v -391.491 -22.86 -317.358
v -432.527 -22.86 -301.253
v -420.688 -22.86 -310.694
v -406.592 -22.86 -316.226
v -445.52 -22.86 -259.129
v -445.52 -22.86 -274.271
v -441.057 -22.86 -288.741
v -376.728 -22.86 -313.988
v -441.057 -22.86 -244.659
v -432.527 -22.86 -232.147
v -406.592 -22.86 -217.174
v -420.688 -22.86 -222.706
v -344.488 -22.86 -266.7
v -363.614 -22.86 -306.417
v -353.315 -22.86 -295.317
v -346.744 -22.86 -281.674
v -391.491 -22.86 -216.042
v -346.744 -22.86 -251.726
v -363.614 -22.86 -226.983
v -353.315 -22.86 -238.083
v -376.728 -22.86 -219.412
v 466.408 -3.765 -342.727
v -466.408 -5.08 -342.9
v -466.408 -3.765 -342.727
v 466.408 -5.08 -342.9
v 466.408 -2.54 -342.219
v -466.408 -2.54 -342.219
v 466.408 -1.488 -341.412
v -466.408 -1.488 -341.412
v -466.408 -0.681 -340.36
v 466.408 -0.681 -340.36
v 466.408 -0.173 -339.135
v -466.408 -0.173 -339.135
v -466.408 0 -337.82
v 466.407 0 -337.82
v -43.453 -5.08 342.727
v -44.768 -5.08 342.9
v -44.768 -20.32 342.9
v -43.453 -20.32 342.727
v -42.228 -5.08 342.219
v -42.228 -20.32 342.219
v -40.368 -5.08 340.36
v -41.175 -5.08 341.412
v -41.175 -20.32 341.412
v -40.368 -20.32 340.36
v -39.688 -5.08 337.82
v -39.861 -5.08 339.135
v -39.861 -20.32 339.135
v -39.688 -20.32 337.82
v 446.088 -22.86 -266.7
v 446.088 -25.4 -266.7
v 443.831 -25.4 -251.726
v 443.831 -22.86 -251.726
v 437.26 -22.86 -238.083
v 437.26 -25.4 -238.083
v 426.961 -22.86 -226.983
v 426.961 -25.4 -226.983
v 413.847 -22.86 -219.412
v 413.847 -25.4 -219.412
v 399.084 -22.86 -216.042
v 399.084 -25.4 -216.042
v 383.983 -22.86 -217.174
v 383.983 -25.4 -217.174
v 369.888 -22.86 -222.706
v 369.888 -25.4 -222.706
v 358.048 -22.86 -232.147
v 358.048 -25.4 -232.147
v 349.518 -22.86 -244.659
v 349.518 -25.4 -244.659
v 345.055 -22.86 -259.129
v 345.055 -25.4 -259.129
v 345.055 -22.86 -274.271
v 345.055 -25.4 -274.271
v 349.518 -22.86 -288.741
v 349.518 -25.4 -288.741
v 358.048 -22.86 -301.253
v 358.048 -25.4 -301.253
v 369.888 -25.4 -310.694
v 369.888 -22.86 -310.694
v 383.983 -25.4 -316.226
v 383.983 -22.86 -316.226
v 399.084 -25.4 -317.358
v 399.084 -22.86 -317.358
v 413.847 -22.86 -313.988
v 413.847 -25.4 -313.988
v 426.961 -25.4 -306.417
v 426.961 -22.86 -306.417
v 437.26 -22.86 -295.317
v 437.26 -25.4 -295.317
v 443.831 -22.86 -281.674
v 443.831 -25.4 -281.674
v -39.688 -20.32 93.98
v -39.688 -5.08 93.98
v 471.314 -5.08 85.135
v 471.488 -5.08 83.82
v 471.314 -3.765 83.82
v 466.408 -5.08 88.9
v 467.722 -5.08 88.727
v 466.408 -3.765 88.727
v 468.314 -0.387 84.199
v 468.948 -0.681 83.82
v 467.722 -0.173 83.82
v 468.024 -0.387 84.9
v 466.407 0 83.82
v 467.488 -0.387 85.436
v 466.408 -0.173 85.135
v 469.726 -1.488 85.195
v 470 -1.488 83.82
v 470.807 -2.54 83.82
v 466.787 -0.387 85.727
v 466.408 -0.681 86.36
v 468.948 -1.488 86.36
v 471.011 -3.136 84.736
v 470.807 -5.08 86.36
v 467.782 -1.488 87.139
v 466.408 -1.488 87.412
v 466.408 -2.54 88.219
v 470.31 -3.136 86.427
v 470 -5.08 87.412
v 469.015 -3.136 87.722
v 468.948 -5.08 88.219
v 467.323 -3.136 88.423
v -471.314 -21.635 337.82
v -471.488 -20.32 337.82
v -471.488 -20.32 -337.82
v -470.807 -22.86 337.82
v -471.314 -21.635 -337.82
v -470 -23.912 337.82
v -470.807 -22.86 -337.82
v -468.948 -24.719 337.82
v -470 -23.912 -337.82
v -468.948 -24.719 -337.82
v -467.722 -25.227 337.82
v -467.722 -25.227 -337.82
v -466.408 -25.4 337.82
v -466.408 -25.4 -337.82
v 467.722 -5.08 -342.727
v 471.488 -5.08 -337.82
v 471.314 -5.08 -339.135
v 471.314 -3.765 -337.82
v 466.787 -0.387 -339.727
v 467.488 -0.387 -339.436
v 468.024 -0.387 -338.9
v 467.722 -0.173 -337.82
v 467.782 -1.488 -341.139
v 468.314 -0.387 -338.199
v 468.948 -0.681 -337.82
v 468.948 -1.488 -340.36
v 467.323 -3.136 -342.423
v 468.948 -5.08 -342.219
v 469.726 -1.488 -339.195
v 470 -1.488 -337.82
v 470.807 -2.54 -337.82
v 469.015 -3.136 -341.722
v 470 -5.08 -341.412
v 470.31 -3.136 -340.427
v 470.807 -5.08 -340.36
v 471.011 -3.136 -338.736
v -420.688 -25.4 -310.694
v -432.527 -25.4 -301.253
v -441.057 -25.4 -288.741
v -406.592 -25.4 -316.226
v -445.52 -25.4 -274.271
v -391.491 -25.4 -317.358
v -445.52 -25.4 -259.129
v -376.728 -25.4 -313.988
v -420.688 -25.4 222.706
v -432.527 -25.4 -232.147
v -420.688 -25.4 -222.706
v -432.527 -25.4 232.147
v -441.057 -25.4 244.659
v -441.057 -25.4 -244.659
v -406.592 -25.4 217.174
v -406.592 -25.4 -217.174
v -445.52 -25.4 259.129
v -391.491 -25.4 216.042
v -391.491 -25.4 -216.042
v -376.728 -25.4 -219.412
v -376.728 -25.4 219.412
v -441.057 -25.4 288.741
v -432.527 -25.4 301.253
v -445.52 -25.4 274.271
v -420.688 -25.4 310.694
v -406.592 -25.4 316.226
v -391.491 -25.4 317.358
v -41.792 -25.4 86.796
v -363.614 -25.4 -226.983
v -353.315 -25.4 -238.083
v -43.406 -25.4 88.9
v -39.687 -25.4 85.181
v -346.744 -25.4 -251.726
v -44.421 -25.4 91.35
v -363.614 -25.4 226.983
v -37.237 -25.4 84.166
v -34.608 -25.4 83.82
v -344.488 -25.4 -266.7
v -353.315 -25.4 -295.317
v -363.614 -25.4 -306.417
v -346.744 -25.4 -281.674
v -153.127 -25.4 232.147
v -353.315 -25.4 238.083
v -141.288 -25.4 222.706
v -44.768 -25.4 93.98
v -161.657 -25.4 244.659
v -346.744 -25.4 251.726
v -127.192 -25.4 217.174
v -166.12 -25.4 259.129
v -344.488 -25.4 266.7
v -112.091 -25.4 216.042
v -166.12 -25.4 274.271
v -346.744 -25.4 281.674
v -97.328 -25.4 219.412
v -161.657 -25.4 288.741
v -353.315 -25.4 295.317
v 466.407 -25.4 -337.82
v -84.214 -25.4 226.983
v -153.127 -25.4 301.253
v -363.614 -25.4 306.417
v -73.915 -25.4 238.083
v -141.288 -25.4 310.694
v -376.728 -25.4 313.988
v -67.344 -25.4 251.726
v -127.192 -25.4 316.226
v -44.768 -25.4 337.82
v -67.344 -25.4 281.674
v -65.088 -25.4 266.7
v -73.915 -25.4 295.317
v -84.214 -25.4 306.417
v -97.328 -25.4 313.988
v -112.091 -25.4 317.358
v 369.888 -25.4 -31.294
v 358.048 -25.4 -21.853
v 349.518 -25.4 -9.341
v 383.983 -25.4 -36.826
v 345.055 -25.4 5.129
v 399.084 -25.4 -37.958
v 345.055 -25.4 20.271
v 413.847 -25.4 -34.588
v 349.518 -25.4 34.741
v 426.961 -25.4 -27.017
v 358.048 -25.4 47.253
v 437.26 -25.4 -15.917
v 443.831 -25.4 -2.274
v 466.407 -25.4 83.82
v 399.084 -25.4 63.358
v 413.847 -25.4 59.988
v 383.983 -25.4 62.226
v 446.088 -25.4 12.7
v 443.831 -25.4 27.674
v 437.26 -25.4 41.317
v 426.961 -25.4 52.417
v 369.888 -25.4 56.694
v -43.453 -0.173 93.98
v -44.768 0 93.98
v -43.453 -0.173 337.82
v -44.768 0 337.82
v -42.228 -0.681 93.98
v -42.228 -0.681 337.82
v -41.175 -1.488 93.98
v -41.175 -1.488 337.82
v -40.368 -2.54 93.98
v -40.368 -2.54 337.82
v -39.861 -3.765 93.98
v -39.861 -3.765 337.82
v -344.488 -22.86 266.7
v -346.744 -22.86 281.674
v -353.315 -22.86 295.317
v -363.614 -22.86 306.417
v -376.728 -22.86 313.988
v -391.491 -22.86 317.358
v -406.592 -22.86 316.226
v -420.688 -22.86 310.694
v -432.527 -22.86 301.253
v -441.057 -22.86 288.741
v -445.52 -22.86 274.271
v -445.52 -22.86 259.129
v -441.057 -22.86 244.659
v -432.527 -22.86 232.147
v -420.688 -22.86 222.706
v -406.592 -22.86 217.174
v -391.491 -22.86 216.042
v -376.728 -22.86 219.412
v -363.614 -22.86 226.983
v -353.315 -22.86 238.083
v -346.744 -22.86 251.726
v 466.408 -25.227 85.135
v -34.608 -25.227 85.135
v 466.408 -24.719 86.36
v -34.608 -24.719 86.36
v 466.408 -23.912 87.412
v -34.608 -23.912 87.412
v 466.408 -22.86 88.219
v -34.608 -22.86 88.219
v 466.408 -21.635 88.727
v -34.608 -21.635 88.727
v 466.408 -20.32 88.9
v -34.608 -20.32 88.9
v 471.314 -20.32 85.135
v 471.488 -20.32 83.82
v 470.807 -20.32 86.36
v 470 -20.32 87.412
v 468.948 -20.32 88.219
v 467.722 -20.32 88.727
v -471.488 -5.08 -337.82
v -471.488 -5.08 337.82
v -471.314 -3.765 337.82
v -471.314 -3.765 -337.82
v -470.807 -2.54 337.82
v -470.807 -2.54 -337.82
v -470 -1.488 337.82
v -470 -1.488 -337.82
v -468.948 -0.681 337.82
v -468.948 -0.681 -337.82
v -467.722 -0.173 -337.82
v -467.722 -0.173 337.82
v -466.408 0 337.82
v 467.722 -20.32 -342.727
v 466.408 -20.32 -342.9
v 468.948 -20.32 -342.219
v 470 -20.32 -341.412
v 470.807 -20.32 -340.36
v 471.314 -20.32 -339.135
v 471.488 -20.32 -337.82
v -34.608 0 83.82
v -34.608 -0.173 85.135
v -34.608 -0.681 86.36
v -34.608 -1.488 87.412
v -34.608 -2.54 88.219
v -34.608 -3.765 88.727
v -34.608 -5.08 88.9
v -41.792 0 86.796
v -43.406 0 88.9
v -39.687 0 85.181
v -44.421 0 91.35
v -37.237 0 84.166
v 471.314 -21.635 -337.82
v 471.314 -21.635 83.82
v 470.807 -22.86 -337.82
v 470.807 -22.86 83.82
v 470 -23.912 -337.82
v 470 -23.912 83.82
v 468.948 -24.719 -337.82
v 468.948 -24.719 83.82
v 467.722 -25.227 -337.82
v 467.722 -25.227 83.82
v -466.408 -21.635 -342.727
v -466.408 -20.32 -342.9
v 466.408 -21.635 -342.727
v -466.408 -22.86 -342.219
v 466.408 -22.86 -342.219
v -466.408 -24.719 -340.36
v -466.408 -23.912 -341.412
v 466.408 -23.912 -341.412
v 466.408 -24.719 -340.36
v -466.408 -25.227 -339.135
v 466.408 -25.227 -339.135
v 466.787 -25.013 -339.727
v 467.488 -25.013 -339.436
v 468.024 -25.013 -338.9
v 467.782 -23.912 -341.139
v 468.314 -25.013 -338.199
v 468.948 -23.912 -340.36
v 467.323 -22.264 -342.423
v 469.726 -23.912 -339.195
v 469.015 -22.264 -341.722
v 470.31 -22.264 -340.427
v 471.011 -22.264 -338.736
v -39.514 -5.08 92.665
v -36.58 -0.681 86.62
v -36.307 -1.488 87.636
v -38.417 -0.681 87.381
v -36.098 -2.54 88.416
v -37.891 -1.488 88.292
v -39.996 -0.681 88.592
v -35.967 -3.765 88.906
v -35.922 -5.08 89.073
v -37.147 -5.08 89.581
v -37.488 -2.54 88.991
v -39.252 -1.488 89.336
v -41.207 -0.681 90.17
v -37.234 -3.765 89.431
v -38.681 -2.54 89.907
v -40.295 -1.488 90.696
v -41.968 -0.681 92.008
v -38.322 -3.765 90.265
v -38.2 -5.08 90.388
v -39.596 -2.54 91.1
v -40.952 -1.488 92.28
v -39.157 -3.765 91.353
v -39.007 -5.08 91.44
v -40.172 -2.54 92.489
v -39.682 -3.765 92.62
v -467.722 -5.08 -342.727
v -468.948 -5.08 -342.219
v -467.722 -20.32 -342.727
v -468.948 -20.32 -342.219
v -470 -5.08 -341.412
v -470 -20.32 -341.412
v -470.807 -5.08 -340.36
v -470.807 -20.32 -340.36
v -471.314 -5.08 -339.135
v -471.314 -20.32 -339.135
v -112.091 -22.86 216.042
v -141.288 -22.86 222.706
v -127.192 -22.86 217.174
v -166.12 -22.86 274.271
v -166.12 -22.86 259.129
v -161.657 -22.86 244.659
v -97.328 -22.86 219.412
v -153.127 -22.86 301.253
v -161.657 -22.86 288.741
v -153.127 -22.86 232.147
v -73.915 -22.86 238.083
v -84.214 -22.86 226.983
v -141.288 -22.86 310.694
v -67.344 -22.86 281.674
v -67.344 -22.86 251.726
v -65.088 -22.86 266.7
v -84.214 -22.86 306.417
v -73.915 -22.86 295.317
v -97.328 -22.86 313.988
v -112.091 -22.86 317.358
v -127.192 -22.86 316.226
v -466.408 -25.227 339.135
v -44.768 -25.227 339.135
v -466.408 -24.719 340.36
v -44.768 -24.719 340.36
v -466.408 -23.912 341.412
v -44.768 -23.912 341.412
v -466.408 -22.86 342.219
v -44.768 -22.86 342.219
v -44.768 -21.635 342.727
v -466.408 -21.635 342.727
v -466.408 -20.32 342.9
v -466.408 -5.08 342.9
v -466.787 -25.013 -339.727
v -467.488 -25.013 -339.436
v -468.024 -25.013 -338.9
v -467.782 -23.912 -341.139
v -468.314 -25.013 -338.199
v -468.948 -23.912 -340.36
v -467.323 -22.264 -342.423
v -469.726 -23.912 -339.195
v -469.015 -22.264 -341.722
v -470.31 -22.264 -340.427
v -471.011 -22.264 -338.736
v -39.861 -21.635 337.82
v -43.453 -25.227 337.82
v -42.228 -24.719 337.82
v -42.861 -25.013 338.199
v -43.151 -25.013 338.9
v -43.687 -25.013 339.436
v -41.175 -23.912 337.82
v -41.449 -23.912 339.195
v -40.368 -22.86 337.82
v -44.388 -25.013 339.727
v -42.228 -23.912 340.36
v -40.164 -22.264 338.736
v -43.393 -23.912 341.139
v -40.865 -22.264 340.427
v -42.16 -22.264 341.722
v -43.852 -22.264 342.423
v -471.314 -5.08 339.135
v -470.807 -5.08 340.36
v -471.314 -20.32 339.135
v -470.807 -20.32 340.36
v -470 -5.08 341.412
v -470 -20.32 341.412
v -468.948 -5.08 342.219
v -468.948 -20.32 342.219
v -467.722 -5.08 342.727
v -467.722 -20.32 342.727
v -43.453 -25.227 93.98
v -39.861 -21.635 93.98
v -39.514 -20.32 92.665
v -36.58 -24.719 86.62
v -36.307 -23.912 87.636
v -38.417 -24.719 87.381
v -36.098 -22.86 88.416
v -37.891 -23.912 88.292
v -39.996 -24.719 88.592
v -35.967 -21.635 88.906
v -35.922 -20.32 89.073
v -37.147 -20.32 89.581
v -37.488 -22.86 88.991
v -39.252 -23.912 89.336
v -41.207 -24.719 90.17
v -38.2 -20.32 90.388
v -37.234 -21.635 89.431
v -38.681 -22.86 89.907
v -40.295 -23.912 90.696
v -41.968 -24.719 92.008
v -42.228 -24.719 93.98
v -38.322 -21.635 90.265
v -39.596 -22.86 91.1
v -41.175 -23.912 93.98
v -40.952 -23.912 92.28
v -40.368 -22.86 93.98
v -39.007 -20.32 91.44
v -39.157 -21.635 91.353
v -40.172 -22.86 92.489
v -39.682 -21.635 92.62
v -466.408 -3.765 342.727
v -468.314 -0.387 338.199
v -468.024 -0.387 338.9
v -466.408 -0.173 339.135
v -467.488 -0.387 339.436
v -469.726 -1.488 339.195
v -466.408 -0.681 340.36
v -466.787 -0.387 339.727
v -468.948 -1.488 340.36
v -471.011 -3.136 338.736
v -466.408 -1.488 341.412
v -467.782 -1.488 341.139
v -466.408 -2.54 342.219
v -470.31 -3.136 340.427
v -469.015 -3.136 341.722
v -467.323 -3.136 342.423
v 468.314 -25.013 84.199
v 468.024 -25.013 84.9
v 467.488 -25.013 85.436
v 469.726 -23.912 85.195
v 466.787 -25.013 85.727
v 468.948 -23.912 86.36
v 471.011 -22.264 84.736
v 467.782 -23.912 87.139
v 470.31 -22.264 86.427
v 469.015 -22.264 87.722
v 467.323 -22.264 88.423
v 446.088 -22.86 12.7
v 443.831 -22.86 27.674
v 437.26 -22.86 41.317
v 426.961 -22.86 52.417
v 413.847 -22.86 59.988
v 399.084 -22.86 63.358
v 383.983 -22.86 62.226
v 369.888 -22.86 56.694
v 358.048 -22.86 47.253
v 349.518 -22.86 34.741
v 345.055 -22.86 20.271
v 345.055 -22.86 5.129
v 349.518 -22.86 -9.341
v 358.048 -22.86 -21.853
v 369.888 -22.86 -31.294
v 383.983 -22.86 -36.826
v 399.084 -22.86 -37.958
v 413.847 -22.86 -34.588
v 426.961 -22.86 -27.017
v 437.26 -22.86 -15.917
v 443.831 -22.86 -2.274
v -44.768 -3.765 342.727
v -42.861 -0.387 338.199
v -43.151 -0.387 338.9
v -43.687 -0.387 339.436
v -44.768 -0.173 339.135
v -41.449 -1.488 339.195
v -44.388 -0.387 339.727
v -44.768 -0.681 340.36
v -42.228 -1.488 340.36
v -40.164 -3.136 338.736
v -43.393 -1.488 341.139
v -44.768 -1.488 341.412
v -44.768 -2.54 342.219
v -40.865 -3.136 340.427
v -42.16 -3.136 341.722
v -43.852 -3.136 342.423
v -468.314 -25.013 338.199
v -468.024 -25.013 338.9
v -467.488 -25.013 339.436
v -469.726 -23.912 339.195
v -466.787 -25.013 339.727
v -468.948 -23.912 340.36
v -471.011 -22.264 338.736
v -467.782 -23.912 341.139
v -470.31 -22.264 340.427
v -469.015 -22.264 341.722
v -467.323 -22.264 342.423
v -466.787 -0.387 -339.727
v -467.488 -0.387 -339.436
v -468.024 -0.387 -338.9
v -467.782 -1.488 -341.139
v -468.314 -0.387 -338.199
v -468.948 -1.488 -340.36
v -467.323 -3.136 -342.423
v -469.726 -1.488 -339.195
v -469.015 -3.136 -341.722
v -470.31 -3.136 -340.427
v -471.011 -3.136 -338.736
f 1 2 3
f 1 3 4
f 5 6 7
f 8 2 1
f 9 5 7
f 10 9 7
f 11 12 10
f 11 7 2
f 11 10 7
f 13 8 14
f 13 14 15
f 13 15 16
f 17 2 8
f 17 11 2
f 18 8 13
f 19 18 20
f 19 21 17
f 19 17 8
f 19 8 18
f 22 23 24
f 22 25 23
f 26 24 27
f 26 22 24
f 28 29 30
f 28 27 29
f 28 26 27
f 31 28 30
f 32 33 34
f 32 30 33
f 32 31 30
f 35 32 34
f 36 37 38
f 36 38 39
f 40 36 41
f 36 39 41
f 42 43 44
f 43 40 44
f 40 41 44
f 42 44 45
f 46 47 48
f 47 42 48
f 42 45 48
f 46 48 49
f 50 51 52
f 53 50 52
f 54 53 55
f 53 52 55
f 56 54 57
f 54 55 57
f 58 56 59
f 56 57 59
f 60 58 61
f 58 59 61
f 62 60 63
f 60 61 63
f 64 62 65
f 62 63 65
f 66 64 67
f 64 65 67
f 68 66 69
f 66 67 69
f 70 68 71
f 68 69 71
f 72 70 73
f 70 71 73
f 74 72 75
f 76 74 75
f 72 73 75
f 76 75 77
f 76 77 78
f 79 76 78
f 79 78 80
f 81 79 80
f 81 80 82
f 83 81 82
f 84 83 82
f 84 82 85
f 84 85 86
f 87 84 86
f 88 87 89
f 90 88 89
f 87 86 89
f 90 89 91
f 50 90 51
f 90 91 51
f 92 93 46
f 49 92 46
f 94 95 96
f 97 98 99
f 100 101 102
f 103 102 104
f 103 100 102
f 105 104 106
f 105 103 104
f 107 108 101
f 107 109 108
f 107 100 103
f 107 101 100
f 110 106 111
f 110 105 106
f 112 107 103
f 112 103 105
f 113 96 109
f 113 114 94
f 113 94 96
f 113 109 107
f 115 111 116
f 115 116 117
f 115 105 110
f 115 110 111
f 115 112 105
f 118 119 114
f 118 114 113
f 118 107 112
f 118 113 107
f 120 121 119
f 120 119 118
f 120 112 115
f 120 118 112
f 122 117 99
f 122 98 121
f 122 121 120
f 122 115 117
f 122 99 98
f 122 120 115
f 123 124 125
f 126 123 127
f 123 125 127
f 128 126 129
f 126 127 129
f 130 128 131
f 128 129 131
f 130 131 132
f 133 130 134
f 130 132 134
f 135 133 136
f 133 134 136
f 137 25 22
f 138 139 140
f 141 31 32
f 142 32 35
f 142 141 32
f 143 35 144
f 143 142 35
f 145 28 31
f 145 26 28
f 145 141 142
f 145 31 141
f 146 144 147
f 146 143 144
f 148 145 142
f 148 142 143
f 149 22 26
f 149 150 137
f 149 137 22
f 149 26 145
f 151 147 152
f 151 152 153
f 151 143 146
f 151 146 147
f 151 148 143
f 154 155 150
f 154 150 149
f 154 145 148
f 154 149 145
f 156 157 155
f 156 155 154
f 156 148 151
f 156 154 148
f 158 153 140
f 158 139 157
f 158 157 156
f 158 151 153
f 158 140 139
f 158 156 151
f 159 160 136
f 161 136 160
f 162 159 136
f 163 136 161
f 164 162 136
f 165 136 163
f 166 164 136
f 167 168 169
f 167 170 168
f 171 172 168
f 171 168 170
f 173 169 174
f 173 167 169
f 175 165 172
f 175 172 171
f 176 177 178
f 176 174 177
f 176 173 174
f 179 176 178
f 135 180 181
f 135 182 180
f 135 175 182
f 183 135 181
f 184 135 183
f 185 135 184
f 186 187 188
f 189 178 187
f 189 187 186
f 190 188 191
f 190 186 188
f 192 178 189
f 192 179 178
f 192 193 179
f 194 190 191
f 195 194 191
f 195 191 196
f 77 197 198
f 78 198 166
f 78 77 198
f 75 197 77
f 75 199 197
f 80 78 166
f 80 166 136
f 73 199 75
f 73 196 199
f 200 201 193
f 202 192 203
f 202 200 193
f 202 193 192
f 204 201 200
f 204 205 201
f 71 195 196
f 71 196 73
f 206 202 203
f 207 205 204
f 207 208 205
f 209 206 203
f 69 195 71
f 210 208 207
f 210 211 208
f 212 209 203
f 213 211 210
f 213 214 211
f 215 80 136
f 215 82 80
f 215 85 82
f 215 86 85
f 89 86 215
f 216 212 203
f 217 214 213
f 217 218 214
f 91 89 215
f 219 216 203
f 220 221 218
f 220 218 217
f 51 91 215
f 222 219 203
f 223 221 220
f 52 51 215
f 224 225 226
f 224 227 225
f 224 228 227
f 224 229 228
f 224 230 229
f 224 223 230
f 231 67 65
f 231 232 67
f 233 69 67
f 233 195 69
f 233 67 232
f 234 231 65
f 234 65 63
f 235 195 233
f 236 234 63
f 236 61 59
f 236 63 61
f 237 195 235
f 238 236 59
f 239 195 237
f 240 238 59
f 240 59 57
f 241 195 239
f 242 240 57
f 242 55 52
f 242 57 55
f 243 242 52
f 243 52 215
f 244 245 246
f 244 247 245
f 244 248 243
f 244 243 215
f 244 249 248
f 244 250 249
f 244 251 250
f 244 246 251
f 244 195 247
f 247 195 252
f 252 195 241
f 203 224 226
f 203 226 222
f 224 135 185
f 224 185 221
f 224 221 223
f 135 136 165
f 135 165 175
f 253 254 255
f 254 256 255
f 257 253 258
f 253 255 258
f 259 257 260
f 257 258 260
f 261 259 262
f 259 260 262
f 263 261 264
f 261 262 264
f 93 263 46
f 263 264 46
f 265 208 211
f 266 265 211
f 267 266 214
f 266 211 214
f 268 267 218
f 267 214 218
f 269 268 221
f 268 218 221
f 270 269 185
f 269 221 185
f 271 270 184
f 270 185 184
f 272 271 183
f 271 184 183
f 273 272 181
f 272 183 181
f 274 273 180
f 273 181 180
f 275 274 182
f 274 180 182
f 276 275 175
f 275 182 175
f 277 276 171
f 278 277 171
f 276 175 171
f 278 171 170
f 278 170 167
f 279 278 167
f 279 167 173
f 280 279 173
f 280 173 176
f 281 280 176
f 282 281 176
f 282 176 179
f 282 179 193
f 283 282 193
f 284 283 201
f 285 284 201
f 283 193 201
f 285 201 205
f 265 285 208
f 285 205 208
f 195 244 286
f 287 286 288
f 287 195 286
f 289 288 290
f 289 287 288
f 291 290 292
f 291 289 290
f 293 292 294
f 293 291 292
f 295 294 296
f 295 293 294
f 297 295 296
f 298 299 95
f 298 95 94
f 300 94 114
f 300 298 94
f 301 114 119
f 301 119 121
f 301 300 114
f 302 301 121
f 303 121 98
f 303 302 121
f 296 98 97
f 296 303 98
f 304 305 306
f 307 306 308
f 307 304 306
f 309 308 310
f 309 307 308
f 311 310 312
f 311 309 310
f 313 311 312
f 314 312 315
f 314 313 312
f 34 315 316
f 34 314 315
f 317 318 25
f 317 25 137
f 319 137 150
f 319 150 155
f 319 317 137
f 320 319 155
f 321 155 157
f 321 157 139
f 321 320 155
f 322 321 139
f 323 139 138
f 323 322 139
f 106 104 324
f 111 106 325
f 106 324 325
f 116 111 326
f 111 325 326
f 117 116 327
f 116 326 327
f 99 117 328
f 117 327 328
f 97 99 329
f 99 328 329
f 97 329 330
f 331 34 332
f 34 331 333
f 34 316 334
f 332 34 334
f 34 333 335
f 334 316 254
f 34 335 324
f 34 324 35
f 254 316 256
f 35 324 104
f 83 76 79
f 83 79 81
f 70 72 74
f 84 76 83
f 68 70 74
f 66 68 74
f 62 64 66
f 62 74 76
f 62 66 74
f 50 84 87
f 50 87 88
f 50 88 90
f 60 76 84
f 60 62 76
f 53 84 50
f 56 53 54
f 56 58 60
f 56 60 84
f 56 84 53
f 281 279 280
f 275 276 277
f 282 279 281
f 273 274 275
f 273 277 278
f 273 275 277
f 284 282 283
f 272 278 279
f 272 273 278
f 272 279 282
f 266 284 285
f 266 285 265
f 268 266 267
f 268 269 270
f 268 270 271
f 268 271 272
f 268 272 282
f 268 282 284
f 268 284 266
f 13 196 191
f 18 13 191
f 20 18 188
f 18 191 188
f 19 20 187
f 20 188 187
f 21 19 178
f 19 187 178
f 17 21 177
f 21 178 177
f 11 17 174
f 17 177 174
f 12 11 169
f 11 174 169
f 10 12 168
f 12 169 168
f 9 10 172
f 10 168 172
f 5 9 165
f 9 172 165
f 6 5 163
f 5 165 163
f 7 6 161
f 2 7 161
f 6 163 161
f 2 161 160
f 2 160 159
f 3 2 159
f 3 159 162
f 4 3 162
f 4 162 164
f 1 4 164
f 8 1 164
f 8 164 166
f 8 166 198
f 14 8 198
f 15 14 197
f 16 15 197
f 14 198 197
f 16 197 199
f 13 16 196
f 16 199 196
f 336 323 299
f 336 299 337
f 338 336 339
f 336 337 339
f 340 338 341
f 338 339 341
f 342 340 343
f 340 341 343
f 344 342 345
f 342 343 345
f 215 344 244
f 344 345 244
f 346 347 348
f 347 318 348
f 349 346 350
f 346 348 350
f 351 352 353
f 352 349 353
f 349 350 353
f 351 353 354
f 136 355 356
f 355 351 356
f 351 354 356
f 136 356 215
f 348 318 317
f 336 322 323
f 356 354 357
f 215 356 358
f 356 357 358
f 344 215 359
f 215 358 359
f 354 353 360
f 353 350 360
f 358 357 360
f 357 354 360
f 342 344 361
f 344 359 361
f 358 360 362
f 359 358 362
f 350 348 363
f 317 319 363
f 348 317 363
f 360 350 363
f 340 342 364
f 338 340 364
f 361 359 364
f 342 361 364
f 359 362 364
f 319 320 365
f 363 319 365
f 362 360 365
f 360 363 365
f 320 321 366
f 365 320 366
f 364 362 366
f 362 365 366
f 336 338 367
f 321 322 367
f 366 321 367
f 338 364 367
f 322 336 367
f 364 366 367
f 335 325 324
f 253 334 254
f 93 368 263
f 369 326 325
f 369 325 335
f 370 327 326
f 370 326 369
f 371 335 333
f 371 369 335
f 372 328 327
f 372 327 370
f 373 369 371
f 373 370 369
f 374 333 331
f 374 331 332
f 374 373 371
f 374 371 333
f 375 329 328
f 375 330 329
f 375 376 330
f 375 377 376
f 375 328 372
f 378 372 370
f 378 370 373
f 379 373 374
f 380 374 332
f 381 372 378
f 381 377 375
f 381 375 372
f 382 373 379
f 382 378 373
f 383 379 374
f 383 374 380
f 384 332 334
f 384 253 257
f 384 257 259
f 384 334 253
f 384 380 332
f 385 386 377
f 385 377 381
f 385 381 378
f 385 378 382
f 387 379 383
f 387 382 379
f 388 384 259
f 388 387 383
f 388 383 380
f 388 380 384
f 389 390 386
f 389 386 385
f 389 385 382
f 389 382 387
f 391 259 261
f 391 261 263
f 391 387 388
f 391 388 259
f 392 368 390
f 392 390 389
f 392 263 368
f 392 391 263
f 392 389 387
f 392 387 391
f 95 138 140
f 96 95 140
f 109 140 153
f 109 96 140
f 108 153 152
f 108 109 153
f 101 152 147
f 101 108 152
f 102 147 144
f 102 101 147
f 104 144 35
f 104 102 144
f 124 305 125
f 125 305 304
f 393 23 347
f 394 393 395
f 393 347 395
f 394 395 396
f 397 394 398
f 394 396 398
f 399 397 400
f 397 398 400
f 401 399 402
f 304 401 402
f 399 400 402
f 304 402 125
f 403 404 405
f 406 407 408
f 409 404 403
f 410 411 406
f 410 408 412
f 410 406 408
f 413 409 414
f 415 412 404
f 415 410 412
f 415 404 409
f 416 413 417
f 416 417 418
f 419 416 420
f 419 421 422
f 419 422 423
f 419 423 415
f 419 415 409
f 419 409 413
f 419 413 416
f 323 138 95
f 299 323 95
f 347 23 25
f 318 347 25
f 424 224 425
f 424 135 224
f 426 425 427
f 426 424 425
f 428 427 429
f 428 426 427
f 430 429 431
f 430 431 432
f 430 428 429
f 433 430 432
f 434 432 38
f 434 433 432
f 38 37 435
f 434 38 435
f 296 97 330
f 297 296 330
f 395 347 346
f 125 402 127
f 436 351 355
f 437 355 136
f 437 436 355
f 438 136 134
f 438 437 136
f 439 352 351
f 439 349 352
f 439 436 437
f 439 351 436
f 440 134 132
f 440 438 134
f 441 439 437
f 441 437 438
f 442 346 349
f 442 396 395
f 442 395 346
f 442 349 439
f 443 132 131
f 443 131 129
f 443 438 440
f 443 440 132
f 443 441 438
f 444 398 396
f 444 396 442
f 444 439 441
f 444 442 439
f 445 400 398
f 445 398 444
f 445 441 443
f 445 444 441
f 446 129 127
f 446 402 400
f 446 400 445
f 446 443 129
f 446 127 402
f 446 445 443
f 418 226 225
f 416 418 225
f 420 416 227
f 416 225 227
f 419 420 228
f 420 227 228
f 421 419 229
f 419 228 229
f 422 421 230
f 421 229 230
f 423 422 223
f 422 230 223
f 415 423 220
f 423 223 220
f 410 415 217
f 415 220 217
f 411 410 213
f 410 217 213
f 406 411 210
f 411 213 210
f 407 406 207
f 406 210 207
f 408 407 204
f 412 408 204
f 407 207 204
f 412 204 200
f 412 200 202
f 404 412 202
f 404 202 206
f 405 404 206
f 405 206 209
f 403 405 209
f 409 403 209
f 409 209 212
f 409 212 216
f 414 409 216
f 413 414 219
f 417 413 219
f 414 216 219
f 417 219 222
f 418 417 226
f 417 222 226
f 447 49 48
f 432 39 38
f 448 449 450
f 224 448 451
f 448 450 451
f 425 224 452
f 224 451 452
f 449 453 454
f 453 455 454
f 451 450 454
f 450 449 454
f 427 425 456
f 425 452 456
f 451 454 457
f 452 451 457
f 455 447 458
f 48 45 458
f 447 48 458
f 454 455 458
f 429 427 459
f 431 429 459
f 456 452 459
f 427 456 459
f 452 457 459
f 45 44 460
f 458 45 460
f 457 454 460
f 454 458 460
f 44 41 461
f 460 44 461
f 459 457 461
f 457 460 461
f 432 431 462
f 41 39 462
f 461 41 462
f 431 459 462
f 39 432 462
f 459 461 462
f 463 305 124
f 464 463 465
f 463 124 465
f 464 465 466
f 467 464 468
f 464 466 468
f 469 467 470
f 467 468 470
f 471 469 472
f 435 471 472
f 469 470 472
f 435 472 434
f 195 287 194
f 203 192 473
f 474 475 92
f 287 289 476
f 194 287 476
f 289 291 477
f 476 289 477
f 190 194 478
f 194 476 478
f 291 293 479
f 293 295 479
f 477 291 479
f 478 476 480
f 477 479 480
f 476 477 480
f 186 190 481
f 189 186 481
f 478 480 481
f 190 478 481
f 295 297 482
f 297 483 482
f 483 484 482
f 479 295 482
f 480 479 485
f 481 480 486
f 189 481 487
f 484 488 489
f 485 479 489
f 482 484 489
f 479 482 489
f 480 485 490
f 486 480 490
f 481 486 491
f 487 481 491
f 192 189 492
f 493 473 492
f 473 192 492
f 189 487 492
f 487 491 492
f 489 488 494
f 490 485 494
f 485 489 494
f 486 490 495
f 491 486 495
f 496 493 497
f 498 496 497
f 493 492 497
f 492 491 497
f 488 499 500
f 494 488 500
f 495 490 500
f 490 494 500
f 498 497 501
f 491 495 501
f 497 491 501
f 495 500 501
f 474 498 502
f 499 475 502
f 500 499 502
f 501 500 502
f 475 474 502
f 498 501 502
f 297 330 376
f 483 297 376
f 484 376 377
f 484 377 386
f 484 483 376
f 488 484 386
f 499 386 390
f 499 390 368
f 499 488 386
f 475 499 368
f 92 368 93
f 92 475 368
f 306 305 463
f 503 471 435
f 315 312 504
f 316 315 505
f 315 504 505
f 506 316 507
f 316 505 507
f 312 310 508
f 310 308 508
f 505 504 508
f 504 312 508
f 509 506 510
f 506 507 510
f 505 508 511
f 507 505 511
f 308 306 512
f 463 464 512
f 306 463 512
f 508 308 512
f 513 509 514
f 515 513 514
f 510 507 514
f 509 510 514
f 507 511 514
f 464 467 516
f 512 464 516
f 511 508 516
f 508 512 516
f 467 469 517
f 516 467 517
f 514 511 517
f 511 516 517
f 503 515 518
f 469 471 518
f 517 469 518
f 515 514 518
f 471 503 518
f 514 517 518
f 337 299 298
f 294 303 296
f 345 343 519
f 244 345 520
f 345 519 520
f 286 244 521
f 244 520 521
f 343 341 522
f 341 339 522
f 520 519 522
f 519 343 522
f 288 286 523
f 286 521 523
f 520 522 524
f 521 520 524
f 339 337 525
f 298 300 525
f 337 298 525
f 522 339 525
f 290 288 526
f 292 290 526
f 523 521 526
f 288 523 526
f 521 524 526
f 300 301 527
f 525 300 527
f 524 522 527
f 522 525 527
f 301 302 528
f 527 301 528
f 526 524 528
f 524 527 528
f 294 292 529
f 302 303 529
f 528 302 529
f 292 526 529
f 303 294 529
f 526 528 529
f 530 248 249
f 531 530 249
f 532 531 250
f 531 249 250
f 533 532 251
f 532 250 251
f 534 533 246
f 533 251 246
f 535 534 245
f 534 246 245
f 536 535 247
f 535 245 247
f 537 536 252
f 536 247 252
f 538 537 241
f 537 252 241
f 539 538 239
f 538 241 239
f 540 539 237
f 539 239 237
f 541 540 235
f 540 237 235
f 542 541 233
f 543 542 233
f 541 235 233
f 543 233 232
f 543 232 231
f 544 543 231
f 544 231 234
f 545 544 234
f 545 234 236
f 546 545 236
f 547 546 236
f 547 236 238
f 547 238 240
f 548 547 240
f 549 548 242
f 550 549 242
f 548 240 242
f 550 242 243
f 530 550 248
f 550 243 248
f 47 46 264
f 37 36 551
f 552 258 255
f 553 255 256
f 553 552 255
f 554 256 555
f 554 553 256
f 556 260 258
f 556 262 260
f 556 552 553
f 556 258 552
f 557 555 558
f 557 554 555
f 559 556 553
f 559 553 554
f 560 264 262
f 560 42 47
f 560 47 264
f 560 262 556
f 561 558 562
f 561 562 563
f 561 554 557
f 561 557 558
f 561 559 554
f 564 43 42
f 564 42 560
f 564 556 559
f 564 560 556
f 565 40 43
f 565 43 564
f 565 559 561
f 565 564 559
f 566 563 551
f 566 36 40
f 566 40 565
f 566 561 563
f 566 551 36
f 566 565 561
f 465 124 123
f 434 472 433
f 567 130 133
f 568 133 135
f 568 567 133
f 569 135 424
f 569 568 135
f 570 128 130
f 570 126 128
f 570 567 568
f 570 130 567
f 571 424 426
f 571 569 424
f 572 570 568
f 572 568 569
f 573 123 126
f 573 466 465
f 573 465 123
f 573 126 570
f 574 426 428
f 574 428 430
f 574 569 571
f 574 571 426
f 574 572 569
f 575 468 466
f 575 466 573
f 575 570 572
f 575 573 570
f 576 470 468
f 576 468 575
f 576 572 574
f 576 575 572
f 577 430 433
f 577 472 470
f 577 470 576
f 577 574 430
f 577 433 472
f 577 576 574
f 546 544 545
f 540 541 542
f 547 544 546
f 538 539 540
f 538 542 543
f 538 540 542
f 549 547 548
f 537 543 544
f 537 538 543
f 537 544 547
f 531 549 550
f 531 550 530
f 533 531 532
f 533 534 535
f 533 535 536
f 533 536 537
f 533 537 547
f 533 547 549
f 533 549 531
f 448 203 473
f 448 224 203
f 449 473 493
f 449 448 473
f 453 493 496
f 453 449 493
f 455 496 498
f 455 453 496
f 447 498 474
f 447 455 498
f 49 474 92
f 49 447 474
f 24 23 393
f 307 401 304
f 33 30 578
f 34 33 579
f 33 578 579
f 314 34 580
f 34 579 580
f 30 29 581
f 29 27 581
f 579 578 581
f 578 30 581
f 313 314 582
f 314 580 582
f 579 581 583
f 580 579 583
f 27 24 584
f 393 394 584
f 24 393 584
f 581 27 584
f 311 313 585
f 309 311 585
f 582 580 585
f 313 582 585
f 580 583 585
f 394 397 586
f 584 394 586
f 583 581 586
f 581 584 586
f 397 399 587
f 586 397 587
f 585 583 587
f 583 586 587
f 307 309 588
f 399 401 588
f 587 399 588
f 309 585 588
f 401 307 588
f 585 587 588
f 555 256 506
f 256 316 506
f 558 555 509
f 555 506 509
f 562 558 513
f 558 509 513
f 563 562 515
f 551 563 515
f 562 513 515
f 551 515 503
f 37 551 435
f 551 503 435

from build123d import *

# Parameters (mm, degrees)
F1_DEPTH = 25.4
F3_R     = 50.8
F4_DEPTH = 2.54
F5_R     = 5.08


with BuildPart() as f1:
    # F0 (on Front) → F1 (new body)
    with BuildSketch(Plane.XZ):
        Polygon((-471.4875, -342.9), (471.4875, -342.9), (471.4875, 88.9), (-39.6875, 88.9), (-39.6875, 342.9), (-471.4875, 342.9), align=None)
    extrude(amount=F1_DEPTH)

    # F3 (on face) → F4 (cut)
    with BuildSketch(Plane.XZ.offset(25.4)):
        with Locations((-395.2875, 266.7)):
            Circle(F3_R)
        with Locations((-115.8875, 266.7)):
            Circle(F3_R)
        with Locations((-395.2875, -266.7)):
            Circle(F3_R)
        with Locations((395.2875, -266.7)):
            Circle(F3_R)
        with Locations((395.2875, 12.7)):
            Circle(F3_R)
    extrude(amount=-F4_DEPTH, mode=Mode.SUBTRACT)

    # F5
    f5_edges = [f1.edges().sort_by_distance(p)[0] for p in [
        (-471.4875, -12.7, -342.9),
        (471.4875, -12.7, -342.9),
        (0, 0, -342.9),
        (0, -25.4, -342.9),
        (-471.4875, -12.7, 342.9),
        (-471.4875, 0, 0),
        (-471.4875, -25.4, 0),
        (471.4875, -12.7, 88.9),
        (471.4875, 0, -127),
        (471.4875, -25.4, -127),
        (-39.6875, -12.7, 88.9),
        (215.9, 0, 88.9),
        (215.9, -25.4, 88.9),
        (-39.6875, -12.7, 342.9),
        (-39.6875, 0, 215.9),
        (-39.6875, -25.4, 215.9),
        (-255.5875, 0, 342.9),
        (-255.5875, -25.4, 342.9),
    ]]
    fillet(f5_edges, radius=F5_R)


solid = f1.part
